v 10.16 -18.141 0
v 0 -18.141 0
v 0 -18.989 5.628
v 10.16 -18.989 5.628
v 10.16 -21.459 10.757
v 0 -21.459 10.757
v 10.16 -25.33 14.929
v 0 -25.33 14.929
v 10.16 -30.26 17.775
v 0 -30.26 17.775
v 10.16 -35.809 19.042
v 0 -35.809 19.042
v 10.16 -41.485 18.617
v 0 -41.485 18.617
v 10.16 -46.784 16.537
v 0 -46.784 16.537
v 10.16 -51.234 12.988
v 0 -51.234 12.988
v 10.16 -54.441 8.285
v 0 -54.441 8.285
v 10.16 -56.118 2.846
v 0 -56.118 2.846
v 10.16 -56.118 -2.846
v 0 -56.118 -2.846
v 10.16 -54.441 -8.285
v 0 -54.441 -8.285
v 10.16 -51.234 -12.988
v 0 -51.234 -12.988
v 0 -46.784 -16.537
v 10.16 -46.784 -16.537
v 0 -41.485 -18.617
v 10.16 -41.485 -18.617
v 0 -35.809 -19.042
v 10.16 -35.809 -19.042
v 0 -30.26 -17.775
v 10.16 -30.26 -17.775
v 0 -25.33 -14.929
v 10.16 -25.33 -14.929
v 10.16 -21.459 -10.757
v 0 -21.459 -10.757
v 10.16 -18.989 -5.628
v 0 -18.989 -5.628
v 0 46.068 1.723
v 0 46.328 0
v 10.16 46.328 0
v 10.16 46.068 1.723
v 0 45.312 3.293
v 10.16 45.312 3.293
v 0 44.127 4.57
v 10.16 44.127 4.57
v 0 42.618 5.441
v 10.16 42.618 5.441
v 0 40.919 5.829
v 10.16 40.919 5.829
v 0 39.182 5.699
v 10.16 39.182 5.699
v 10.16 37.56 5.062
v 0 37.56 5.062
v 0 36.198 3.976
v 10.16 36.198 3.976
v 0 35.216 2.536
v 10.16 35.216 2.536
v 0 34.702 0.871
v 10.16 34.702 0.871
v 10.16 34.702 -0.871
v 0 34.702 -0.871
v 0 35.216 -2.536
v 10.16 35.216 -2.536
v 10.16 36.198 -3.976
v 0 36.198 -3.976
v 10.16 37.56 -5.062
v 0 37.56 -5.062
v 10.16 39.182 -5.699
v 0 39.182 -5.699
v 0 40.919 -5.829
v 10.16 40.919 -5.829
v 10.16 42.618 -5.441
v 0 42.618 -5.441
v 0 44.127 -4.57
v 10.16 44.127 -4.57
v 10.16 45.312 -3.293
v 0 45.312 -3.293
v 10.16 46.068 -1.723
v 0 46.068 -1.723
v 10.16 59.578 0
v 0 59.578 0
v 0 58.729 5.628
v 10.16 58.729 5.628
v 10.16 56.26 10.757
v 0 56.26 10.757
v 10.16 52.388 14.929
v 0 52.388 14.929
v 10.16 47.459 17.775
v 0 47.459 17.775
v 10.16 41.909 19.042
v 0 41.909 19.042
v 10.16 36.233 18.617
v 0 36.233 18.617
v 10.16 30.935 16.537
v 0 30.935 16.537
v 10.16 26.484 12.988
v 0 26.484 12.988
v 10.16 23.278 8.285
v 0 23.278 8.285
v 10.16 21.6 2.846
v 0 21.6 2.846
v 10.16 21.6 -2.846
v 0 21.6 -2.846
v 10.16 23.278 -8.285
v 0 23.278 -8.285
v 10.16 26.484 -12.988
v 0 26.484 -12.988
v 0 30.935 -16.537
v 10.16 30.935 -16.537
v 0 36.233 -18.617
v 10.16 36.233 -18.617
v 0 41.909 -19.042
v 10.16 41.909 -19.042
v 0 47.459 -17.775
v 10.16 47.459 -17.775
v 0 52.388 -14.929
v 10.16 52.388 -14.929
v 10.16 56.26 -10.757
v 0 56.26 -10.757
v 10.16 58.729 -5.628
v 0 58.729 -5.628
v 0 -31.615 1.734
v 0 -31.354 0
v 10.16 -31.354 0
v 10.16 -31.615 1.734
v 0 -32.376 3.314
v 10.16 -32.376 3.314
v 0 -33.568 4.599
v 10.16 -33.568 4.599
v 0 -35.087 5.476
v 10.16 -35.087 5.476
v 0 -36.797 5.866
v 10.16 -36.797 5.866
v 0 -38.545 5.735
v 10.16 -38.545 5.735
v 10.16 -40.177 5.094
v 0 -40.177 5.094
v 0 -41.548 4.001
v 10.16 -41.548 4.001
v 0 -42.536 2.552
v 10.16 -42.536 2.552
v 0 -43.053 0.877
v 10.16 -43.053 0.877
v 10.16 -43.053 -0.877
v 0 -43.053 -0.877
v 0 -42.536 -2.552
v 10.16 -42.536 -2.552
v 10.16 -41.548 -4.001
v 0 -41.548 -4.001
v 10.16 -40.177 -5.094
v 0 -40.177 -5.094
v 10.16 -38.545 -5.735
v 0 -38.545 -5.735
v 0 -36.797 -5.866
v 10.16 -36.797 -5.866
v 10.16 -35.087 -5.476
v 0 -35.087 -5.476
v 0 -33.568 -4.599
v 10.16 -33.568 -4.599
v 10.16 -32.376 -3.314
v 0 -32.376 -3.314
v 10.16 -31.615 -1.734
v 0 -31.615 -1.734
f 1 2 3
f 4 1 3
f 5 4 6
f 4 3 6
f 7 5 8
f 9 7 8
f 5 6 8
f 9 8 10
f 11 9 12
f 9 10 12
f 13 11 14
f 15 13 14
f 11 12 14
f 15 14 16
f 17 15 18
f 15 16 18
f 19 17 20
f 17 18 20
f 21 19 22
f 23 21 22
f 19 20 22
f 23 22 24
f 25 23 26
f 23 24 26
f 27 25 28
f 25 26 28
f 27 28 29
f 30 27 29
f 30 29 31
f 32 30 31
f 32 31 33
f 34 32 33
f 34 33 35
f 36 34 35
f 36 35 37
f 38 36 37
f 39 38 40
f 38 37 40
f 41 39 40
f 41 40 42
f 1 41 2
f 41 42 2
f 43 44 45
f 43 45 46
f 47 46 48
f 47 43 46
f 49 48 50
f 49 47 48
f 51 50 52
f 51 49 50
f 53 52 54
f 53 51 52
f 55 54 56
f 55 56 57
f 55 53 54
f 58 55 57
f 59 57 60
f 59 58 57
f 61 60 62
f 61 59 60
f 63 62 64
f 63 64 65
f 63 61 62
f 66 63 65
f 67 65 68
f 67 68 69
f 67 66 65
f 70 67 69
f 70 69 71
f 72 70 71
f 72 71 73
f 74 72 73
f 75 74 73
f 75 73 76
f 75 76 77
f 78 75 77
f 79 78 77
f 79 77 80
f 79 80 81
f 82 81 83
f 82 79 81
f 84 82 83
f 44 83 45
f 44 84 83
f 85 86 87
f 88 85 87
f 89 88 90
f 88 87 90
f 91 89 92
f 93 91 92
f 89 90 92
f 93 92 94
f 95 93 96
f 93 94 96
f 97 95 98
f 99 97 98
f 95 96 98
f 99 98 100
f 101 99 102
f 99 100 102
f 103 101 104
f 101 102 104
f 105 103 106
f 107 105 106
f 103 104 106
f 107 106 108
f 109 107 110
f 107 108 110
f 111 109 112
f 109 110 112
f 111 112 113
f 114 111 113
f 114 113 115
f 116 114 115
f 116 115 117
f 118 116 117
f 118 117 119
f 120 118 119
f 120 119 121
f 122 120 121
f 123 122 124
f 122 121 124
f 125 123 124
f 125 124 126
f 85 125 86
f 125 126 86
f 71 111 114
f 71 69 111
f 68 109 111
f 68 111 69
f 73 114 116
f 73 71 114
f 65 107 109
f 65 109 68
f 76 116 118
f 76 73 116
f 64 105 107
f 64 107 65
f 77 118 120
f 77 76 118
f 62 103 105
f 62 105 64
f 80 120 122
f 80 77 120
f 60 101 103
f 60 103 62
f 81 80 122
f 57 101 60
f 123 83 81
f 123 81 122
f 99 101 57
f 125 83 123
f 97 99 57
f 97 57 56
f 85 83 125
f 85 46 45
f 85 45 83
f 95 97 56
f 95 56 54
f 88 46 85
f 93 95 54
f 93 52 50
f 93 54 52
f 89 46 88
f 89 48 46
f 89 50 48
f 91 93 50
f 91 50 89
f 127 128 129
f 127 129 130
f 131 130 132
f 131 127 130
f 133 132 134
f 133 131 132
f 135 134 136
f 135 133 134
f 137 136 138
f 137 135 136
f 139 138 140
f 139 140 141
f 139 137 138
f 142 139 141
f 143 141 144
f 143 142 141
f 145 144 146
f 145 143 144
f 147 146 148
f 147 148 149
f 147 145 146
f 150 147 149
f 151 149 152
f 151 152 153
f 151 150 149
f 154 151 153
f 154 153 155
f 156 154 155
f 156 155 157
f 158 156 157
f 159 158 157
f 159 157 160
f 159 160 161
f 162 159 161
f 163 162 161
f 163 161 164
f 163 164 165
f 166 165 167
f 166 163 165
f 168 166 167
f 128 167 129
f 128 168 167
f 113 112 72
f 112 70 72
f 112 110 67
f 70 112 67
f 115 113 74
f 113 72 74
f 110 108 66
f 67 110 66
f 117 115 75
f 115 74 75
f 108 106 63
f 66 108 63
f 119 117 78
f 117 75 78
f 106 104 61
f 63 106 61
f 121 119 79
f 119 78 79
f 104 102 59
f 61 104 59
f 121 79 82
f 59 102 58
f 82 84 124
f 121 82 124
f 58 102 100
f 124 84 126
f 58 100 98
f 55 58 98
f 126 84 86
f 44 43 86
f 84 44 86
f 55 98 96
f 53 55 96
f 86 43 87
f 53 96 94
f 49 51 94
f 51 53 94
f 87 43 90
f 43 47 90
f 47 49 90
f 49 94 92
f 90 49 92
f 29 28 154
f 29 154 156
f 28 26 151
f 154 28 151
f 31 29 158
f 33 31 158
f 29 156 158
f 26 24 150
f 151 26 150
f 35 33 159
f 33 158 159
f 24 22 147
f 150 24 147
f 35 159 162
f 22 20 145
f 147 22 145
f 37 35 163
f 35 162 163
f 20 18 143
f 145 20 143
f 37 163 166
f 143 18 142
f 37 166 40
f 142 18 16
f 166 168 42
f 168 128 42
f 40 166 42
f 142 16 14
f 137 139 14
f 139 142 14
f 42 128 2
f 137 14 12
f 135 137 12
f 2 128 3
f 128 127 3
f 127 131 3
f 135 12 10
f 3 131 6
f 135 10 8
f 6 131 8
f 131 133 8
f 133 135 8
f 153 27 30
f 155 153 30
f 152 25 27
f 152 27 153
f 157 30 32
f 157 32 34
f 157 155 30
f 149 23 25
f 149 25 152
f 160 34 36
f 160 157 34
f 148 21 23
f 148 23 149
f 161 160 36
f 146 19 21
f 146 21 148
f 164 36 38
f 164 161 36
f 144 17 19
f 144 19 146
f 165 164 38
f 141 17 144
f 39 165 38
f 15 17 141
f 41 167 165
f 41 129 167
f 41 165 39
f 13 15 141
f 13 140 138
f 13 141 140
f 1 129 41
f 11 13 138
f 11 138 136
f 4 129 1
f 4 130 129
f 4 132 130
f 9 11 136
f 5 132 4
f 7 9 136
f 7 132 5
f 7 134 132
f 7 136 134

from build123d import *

# Parameters (mm, degrees)
F0_R     = 19.095466
F0_R_2   = 5.882519
F0_R_3   = 5.845209
F1_DEPTH = 10.16


with BuildPart() as f1:
    # F0 (on Right) → F1 (new body)
    with BuildSketch(Plane.YZ):
        with Locations((-37.236158, 0)):
            Circle(F0_R)
        with Locations((-37.236158, 0)):
            Circle(F0_R_2, mode=Mode.SUBTRACT)
        with Locations((40.482387, 0)):
            Circle(F0_R)
        with Locations((40.482387, 0)):
            Circle(F0_R_3, mode=Mode.SUBTRACT)
    extrude(amount=F1_DEPTH)


solid = f1.part
